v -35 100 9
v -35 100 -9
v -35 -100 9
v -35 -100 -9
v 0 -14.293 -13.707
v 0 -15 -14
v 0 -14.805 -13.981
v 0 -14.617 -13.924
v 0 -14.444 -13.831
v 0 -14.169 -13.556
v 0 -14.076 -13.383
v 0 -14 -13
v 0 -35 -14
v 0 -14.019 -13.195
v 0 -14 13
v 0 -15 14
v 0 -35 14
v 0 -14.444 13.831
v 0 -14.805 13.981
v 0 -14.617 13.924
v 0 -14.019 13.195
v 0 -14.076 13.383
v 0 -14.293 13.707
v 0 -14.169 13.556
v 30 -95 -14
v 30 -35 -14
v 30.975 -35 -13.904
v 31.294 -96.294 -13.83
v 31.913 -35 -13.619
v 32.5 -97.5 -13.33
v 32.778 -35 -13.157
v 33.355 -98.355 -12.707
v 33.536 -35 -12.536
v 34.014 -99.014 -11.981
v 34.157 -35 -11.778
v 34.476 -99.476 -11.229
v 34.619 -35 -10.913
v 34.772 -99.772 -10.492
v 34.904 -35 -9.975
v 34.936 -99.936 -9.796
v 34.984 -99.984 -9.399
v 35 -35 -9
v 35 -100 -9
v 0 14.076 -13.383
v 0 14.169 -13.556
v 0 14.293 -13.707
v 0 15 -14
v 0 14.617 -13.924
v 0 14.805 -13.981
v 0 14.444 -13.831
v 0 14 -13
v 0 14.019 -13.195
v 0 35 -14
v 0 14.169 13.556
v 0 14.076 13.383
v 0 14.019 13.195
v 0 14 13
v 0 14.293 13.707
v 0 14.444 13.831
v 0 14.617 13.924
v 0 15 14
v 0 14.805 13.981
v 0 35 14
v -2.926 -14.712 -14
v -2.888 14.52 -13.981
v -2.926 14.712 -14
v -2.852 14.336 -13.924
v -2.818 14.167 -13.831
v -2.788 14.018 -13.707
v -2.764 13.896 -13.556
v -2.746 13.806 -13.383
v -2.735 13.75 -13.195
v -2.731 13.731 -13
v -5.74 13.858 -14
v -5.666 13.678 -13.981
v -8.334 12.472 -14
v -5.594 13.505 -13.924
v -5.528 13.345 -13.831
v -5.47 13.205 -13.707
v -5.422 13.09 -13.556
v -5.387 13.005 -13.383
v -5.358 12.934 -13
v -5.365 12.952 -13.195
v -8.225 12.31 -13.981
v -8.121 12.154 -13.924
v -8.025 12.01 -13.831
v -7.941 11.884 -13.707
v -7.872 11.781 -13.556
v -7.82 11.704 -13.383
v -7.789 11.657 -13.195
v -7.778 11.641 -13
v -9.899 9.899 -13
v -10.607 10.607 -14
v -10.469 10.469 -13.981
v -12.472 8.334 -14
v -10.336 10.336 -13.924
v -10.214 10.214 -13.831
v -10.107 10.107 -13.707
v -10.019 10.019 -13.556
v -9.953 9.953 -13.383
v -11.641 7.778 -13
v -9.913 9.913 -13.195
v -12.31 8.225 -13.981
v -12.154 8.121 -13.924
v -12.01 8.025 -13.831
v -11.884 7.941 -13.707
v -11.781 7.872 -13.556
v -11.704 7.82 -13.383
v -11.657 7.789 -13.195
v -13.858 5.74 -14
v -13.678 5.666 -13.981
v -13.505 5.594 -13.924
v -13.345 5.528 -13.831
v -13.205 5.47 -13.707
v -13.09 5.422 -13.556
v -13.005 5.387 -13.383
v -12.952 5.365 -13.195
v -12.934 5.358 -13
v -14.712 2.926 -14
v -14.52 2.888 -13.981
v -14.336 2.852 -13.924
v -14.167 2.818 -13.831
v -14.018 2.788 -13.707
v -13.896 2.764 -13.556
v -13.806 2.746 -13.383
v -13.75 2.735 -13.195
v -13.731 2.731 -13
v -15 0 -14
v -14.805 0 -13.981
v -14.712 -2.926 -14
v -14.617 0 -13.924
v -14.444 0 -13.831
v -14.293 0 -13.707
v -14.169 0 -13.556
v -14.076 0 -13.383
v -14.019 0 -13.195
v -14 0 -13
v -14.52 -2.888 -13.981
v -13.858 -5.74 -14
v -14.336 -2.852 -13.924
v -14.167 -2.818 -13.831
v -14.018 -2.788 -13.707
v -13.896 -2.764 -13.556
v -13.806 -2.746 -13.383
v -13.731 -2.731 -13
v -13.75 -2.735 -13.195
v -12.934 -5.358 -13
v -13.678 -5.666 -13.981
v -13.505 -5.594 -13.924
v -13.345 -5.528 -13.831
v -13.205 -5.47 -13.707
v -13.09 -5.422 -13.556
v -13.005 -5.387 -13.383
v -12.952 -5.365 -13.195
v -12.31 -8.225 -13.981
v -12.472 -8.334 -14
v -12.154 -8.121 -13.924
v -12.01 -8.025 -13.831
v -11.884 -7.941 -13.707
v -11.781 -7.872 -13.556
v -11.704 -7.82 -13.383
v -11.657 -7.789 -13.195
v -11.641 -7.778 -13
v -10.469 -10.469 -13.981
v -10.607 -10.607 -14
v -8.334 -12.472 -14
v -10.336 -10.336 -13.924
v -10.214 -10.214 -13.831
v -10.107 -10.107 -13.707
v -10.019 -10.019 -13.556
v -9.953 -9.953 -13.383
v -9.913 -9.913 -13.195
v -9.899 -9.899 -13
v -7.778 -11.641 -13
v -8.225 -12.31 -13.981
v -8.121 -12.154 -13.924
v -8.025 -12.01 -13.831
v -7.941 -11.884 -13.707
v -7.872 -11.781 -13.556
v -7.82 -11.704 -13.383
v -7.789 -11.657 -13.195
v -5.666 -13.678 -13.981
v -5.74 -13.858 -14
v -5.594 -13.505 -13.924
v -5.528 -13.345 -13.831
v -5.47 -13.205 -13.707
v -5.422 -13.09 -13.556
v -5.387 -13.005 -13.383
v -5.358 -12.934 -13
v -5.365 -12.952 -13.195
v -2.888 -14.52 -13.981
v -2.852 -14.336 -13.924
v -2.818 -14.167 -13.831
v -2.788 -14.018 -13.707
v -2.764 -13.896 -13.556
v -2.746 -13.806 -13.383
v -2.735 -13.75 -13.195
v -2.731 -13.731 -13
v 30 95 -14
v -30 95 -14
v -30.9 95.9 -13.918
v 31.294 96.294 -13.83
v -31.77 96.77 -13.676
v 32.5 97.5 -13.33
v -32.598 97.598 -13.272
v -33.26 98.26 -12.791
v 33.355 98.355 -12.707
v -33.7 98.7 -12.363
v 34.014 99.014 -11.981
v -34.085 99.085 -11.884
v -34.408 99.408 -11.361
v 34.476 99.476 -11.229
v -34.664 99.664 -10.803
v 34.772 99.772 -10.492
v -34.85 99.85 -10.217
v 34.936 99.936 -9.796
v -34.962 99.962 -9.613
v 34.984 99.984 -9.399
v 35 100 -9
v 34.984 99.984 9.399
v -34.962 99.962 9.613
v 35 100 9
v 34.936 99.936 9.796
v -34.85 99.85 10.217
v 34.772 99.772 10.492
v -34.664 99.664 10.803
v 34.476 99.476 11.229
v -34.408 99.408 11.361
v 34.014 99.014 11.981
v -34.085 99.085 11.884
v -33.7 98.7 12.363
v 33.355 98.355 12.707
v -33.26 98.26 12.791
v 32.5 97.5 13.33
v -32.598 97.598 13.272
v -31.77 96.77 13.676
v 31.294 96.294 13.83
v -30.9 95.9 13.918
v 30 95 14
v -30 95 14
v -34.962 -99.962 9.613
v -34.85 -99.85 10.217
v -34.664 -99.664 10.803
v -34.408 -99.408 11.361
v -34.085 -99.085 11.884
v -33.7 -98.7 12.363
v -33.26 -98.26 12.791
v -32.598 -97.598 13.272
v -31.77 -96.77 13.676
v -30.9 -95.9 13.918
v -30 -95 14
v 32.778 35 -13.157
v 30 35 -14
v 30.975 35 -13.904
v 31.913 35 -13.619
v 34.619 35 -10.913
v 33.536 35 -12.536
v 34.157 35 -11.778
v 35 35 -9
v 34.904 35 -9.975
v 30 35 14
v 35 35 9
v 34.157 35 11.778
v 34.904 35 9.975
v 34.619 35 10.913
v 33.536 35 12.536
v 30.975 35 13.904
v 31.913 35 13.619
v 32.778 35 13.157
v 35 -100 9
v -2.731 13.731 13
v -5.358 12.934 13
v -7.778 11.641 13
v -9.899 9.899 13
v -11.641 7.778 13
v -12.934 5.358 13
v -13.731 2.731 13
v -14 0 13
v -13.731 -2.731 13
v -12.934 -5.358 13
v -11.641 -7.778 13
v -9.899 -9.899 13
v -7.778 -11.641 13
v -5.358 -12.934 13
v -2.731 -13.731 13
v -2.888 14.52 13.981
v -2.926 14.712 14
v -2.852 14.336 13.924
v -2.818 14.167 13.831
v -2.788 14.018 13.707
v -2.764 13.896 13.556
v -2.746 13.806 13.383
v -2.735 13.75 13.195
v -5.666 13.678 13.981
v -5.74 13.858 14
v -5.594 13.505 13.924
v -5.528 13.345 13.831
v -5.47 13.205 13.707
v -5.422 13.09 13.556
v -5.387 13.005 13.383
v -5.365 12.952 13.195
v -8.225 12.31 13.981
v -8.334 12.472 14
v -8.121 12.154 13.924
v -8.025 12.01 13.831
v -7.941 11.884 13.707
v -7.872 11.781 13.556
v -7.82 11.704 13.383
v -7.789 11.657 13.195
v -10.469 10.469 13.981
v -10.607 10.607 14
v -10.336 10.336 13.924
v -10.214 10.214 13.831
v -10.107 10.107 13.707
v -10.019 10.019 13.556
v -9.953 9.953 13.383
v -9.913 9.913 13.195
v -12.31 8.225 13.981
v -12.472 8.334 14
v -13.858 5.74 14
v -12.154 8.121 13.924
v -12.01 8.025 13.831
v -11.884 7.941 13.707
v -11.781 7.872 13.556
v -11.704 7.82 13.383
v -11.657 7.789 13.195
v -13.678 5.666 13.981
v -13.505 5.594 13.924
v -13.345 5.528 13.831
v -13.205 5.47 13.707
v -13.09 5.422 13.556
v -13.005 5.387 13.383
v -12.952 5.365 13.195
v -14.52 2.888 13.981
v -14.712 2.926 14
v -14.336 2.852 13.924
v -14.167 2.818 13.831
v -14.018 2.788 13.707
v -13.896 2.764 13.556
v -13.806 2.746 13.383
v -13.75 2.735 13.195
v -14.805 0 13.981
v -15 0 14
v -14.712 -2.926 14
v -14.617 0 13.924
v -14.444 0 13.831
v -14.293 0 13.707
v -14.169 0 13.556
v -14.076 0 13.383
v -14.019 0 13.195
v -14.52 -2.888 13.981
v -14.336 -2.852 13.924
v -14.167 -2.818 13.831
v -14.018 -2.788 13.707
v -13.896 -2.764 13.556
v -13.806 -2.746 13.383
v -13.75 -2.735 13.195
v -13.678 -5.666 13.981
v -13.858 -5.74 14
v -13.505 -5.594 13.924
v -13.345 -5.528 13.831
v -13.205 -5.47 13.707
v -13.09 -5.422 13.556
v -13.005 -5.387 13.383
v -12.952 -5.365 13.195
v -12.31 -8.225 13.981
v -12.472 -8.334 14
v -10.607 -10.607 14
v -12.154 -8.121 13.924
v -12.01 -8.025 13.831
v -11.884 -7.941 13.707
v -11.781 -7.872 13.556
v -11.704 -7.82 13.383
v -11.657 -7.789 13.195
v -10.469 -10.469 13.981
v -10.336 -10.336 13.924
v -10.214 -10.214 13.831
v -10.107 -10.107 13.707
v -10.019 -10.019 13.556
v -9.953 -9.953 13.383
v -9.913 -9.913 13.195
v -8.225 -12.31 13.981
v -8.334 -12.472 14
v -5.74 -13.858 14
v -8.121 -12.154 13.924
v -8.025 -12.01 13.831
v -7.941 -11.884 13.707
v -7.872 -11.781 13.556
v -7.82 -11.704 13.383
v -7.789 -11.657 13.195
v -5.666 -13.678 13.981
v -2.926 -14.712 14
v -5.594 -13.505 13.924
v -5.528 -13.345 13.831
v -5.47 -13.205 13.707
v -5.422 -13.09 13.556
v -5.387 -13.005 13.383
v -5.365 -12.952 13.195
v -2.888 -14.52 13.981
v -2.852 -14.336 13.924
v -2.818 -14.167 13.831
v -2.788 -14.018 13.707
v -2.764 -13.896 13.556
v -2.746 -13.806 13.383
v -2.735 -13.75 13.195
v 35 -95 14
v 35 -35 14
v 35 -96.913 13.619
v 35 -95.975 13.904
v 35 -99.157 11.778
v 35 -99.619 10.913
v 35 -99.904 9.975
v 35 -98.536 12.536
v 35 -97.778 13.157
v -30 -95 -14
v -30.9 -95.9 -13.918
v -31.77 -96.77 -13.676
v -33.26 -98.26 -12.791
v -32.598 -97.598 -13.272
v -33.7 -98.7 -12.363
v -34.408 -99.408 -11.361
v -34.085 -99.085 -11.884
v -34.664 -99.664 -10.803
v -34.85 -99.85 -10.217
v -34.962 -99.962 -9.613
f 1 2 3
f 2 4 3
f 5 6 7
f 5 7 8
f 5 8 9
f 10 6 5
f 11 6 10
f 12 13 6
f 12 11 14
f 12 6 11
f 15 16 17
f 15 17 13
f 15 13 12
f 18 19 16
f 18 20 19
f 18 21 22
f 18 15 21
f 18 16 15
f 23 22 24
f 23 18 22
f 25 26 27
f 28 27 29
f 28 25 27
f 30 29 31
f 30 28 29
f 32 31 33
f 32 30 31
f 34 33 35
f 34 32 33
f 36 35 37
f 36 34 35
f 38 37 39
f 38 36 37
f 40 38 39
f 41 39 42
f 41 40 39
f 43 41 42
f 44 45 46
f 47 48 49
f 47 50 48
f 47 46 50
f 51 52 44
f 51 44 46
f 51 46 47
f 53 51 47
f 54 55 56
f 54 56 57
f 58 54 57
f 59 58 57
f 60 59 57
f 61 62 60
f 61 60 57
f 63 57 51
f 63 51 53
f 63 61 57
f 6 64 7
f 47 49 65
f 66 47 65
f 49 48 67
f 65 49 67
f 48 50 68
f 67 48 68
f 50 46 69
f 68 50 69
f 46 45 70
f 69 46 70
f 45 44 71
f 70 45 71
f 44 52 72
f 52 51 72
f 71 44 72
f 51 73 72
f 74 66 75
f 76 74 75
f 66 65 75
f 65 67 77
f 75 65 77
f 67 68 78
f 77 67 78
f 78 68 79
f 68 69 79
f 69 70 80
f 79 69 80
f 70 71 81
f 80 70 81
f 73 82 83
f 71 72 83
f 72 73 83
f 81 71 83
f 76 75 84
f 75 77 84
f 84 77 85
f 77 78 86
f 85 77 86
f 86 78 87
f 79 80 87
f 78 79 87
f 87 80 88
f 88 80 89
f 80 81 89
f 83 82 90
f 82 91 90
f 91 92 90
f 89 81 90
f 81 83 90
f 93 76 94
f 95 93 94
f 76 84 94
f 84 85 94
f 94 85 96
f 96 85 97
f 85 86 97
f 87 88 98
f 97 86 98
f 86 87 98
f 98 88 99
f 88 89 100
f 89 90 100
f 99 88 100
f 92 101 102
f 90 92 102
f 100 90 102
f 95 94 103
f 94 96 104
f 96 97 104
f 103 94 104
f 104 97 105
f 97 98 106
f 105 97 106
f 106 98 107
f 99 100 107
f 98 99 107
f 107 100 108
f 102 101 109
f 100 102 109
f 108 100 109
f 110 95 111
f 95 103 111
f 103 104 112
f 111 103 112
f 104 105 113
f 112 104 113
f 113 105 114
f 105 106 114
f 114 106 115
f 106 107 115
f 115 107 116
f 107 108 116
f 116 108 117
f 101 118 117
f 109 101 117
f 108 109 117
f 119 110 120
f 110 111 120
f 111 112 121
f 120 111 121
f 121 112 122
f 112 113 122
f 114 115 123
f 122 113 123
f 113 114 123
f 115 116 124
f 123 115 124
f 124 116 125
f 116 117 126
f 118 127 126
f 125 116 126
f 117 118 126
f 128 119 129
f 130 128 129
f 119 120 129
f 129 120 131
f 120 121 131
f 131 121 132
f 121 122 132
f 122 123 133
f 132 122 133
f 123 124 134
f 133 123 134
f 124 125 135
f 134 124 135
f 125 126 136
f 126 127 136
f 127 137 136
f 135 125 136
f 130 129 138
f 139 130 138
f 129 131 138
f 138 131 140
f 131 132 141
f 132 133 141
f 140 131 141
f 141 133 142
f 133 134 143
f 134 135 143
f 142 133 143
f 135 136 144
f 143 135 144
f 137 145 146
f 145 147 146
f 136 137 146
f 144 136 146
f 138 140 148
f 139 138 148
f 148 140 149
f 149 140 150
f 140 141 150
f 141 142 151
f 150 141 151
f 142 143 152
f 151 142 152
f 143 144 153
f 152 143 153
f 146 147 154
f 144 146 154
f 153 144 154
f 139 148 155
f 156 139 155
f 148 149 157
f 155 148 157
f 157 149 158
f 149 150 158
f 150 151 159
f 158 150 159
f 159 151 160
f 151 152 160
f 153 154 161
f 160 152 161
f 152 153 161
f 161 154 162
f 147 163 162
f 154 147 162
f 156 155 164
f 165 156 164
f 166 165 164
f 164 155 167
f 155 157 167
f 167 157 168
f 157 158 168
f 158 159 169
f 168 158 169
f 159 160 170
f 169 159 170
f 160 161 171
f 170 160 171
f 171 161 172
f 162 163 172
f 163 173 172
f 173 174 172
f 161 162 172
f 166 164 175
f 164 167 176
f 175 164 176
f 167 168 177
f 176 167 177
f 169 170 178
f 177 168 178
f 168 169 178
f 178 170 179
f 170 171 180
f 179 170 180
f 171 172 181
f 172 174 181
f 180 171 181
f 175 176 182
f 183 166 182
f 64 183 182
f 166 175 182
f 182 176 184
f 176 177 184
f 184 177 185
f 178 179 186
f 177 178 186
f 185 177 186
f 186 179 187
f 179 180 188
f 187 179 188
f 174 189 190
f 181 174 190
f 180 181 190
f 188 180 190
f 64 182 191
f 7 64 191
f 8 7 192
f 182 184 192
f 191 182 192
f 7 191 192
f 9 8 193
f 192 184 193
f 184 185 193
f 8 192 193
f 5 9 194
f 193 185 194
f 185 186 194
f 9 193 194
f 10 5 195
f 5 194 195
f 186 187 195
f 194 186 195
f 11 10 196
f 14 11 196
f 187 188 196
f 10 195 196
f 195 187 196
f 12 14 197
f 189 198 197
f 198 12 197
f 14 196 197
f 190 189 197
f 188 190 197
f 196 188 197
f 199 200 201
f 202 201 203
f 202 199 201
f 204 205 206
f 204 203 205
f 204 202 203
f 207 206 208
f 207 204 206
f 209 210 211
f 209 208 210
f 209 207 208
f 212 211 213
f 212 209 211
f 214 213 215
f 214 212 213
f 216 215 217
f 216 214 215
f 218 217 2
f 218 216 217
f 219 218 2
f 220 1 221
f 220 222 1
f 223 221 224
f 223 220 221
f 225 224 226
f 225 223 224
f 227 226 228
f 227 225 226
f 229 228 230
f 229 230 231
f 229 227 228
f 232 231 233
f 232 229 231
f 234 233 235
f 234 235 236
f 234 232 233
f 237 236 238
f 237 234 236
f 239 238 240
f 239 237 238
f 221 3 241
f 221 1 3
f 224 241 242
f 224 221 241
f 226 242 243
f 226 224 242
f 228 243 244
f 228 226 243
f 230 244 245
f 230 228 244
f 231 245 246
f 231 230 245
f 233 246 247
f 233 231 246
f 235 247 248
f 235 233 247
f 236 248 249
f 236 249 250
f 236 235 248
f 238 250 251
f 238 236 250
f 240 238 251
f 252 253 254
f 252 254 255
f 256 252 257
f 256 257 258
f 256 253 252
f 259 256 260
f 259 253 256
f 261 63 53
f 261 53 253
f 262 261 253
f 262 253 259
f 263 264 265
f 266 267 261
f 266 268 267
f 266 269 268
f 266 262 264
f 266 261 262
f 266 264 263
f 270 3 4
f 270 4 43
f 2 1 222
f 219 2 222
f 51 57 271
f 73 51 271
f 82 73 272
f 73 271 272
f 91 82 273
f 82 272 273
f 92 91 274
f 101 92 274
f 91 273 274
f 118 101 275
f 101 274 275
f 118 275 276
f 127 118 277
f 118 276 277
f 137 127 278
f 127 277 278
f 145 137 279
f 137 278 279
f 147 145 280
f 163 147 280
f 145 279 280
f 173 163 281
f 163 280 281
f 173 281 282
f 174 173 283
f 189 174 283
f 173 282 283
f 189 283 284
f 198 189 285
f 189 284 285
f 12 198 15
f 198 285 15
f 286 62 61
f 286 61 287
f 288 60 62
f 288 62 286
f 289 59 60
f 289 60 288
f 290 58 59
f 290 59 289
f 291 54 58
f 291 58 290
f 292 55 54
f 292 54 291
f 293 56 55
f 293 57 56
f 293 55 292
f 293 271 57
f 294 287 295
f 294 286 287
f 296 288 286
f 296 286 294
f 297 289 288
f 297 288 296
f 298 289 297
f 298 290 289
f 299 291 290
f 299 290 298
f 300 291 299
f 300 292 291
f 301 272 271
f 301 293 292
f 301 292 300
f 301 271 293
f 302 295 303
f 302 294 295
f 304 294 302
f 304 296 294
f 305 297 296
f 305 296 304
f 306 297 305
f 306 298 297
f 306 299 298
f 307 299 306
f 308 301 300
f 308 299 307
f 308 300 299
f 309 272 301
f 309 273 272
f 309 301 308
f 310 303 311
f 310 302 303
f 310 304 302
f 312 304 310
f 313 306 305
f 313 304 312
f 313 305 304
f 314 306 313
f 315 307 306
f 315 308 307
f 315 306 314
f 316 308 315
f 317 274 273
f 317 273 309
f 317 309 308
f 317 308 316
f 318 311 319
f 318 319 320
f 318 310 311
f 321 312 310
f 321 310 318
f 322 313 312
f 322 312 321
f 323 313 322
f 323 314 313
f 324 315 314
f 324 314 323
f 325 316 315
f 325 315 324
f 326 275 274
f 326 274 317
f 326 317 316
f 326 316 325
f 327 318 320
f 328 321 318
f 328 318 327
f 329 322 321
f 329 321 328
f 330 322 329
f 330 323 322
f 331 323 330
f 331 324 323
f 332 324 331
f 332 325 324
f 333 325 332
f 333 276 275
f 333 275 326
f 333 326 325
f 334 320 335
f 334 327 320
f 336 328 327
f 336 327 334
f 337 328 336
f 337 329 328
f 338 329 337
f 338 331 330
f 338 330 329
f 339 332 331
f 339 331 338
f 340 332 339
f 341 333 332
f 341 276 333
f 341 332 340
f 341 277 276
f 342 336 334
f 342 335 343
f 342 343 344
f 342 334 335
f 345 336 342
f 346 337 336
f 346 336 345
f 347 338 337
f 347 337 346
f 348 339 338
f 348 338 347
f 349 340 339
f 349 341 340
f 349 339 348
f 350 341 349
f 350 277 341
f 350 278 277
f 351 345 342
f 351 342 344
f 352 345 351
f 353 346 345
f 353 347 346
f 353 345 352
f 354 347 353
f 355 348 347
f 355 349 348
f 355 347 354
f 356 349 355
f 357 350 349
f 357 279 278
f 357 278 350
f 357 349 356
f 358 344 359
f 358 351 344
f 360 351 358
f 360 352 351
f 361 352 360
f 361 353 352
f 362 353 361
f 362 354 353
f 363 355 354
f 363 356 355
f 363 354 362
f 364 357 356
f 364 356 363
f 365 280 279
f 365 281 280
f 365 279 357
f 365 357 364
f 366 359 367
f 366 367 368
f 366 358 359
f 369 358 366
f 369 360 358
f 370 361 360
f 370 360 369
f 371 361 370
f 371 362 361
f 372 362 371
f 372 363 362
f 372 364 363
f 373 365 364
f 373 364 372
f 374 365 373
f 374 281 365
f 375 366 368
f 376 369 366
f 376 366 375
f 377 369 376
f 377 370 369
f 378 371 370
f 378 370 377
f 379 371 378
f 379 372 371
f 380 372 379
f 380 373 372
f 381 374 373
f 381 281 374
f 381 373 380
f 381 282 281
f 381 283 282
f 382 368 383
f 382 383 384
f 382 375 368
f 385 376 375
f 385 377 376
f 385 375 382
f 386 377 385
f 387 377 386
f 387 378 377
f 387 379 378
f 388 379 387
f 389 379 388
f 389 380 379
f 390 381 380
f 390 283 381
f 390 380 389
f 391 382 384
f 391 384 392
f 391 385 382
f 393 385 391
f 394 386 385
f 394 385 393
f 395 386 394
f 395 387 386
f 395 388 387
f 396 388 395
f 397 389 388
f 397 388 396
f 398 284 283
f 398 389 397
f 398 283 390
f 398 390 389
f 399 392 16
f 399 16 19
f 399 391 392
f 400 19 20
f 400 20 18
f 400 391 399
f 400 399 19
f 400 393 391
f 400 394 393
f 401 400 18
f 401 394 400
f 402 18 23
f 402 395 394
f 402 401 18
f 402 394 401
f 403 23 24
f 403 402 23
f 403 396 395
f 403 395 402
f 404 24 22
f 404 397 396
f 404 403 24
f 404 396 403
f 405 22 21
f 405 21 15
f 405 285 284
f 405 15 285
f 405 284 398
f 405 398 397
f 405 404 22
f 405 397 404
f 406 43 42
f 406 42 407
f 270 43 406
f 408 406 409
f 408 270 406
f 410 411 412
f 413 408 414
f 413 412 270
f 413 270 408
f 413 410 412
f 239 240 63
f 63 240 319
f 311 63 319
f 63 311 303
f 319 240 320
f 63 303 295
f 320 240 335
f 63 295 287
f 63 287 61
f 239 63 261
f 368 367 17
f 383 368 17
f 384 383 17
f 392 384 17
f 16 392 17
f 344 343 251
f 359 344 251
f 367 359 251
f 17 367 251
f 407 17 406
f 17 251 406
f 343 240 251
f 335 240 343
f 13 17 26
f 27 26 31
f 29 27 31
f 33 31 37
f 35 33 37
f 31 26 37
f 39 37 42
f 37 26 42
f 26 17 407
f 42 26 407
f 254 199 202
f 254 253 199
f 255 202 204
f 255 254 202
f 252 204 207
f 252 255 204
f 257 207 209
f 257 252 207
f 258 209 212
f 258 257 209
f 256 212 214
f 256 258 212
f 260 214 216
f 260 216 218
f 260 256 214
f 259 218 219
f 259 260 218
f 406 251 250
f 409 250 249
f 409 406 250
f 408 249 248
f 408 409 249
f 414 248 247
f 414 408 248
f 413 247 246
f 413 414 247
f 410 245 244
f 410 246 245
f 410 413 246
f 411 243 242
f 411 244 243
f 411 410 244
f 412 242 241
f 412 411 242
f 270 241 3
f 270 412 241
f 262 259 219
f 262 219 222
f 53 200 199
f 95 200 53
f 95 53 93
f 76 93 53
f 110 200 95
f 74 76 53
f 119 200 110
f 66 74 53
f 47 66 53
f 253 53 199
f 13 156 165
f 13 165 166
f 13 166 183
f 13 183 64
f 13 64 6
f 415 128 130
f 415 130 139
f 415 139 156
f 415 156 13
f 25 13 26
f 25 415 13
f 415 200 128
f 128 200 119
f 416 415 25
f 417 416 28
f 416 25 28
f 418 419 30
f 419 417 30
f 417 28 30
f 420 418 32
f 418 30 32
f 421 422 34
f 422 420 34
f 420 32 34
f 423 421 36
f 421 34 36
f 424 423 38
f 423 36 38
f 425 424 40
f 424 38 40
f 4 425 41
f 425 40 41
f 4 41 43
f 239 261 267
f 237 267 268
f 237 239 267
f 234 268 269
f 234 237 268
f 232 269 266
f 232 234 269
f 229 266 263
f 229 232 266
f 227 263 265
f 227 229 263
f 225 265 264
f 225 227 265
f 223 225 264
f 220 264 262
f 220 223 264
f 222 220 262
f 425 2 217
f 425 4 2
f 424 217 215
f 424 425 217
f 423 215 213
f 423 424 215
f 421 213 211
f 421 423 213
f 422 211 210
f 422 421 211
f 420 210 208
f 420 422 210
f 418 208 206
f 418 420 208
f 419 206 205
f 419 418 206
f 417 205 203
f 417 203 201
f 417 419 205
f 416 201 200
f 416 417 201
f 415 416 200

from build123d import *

# Parameters (mm, degrees)
F0_W     = 70
F0_H     = 28
F1_DEPTH = 100
F2_W     = 70
F2_H     = 70
F3_DEPTH = 28.001
F4_R     = 14
F5_DEPTH = 28.001
F6_R     = 5
F7_R     = 1


with BuildPart() as f1:
    # F0 (on Front) → F1 (new body, symmetric)
    with BuildSketch(Plane.XZ):
        Rectangle(F0_W, F0_H)
    extrude(amount=F1_DEPTH, both=True)

    # F2 (on face) → F3 (cut, through all)
    with BuildSketch(Plane.XY.offset(14)):
        with Locations((35, 0)):
            Rectangle(F2_W, F2_H)
    extrude(amount=-F3_DEPTH, mode=Mode.SUBTRACT)

    # F4 (on face) → F5 (cut, through all)
    with BuildSketch(Plane.XY.offset(14)):
        Circle(F4_R)
    extrude(amount=-F5_DEPTH, mode=Mode.SUBTRACT)

    # F6
    f6_edges = [f1.edges().sort_by_distance(p)[0] for p in [
        (-35, 0, 14),
        (35, 67.5, 14),
        (0, 100, 14),
        (0, -100, 14),
        (35, 67.5, -14),
        (-35, 0, -14),
        (35, -67.5, -14),
        (0, -100, -14),
        (0, 100, -14),
    ]]
    fillet(f6_edges, radius=F6_R)

    # F7
    f7_edges = [f1.edges().sort_by_distance(p)[0] for p in [
        (-14, 0, 14),
        (-14, 0, -14),
    ]]
    fillet(f7_edges, radius=F7_R)


solid = f1.part
